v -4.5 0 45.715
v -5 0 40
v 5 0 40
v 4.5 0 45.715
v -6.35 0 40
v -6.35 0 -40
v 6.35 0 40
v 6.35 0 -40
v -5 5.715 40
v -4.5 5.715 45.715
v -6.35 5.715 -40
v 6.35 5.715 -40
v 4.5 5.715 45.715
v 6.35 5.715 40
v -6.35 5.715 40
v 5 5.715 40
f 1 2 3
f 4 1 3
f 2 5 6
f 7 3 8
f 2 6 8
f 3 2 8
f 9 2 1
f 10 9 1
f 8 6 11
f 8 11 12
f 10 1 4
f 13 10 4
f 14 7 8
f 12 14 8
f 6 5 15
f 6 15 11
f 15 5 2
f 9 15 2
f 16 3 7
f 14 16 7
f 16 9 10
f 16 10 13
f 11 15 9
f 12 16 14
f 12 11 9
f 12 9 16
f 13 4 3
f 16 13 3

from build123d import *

# Parameters (mm, degrees)
SKETCH1_W           = 12.7
SKETCH1_H           = 80
BOSS_EXTRUDE1_DEPTH = 5.715


with BuildPart() as part:
    # Sketch1 → Boss-Extrude1 (new body)
    with BuildSketch(Plane(origin=(0, 0, 0), x_dir=(1, 0, 0), z_dir=(0, 1, 0))):
        Rectangle(SKETCH1_W, SKETCH1_H)
        Polygon((5, -40), (-5, -40), (-4.5, -45.715), (4.5, -45.715), align=None)
    extrude(amount=BOSS_EXTRUDE1_DEPTH)


solid = part.part
